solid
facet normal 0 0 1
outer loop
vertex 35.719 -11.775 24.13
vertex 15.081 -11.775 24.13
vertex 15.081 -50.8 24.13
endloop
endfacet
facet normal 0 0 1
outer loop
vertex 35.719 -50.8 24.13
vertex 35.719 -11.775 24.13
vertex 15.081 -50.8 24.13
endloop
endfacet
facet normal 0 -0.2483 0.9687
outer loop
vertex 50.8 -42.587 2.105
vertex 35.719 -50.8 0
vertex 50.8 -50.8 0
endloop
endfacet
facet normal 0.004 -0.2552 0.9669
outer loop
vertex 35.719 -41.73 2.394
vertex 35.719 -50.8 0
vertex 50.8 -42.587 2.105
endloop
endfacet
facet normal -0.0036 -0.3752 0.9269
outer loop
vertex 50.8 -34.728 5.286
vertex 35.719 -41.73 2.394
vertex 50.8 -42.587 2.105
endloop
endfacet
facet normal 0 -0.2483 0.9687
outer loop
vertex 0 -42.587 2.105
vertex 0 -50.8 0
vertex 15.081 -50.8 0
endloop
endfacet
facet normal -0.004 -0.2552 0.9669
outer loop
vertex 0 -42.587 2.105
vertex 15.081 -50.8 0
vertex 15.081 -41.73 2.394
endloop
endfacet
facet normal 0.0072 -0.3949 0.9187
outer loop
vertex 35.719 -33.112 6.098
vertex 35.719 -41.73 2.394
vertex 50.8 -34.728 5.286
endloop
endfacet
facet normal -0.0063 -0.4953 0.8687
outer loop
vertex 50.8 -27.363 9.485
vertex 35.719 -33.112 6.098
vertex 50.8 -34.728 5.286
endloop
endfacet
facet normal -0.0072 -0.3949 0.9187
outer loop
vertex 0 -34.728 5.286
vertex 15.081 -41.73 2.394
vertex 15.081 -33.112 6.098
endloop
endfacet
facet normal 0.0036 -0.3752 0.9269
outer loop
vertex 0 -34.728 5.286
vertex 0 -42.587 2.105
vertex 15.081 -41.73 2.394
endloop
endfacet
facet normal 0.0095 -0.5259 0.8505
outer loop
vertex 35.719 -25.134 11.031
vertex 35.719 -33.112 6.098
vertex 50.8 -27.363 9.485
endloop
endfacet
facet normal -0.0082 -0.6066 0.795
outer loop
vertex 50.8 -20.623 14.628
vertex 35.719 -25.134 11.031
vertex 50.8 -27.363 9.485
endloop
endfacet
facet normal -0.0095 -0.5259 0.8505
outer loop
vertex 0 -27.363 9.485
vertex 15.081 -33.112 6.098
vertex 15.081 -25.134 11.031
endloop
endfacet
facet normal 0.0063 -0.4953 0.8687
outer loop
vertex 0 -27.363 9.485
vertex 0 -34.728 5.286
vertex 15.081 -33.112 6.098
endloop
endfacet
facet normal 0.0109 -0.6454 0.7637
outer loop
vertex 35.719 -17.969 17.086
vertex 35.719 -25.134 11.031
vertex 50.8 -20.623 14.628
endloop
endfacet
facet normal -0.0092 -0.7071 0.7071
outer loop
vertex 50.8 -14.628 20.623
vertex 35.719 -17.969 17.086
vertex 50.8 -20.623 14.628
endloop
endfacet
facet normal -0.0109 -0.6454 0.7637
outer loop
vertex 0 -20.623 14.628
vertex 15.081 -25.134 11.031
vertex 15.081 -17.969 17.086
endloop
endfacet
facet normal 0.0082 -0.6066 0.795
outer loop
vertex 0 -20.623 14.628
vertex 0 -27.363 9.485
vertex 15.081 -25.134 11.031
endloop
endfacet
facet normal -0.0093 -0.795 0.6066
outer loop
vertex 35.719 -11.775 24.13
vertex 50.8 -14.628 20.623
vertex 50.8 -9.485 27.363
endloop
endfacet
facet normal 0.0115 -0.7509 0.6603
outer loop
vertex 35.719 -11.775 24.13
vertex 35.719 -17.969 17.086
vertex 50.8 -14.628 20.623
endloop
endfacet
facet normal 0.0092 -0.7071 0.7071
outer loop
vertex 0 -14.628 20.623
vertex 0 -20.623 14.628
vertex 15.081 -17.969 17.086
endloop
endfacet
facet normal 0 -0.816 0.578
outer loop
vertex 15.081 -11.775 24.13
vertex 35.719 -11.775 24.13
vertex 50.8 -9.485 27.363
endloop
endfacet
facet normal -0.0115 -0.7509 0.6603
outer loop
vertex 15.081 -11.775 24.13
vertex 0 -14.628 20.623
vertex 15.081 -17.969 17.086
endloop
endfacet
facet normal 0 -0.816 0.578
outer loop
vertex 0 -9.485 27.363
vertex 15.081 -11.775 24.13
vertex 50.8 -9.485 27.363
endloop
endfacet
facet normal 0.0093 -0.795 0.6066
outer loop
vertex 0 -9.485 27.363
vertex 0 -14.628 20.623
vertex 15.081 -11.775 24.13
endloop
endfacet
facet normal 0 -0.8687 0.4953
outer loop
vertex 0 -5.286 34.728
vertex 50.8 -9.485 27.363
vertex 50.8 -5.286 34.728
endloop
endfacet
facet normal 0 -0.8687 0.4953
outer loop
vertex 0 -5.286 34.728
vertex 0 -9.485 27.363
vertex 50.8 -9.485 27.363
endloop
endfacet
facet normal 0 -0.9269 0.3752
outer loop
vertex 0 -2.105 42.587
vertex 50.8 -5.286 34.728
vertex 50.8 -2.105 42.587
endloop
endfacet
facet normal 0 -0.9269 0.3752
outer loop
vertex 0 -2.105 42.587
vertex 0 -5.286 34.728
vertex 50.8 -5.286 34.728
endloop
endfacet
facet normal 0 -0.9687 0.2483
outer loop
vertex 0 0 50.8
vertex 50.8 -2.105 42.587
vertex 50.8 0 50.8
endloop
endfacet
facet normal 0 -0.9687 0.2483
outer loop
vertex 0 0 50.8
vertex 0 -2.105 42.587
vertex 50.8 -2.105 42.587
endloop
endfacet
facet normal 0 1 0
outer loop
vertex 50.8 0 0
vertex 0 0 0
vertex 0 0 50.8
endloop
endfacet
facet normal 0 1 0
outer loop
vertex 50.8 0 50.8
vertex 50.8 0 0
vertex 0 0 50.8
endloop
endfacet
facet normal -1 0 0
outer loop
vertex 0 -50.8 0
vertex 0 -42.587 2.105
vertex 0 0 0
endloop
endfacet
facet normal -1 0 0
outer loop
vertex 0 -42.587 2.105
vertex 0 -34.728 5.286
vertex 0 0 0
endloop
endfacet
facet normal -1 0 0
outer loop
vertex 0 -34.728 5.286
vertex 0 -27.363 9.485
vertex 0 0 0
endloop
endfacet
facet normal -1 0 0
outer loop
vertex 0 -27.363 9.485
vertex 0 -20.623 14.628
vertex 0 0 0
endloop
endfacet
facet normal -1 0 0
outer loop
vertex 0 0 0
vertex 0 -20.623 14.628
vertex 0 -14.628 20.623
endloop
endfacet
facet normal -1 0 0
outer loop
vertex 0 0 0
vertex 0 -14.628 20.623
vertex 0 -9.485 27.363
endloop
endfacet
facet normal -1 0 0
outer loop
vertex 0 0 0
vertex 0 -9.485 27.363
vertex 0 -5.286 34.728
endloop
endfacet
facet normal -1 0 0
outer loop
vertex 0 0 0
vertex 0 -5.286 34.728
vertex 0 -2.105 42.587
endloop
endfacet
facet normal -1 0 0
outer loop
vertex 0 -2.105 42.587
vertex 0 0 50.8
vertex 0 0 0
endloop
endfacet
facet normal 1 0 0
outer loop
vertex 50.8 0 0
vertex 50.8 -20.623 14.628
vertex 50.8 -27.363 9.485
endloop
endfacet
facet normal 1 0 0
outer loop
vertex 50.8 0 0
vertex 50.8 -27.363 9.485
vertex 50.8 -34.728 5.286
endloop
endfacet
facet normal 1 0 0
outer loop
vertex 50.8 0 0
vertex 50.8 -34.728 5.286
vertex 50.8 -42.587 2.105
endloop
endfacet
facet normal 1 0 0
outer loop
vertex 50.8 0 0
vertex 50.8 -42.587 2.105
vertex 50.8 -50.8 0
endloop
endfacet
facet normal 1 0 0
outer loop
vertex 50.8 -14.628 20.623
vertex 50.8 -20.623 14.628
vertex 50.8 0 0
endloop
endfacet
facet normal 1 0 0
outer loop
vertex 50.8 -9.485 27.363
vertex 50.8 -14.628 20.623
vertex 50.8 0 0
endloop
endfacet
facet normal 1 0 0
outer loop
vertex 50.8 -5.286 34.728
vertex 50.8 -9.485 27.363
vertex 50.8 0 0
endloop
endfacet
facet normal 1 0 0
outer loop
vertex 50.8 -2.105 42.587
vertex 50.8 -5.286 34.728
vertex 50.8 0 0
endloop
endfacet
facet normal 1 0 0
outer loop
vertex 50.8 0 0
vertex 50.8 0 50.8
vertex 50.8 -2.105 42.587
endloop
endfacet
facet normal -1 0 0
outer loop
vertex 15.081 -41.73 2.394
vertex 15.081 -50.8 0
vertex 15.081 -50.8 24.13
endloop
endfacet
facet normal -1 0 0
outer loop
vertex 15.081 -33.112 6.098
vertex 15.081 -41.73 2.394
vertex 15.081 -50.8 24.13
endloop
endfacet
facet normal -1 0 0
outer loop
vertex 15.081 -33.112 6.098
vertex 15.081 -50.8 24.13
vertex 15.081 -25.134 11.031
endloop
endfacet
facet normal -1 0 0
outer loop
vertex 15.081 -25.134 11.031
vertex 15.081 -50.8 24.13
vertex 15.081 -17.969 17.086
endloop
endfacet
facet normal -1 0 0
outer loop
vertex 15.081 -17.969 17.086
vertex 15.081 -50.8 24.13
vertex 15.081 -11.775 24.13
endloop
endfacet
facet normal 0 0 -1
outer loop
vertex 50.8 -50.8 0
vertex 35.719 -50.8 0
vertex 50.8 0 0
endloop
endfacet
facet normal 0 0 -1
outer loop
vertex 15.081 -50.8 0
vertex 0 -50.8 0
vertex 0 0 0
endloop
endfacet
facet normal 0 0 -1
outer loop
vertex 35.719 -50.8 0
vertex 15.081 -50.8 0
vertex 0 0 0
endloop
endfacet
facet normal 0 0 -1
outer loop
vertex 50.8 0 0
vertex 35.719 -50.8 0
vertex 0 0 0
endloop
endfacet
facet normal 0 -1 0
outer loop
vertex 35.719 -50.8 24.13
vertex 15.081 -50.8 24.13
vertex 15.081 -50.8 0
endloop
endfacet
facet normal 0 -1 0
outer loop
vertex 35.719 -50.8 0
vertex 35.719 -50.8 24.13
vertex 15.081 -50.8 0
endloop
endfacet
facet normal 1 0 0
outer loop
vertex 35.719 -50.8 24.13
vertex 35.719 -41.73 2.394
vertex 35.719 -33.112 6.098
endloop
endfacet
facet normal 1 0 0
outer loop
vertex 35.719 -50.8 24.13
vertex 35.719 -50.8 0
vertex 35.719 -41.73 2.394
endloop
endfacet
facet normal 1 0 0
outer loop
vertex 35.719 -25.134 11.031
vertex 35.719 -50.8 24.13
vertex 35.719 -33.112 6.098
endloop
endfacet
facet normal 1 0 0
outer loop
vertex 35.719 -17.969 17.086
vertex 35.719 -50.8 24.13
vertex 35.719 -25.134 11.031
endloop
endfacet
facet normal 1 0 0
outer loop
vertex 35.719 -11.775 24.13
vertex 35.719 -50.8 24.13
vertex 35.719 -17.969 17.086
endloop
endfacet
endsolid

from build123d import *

# Parameters (mm, degrees)
F1_DEPTH = 50.8
F2_DEPTH = 35.71875
F3_DEPTH = 15.08125


with BuildPart() as f1:
    # F0 (on Right) → F1 (new body)
    with BuildSketch(Plane.YZ):
        with BuildLine():
            Line((-50.8, 0), (0, 0))
            Line((0, 0), (0, 24.13))
            Line((0, 24.13), (-11.7745487484, 24.13))
            ThreePointArc((-11.7745487484, 24.13), (-29.0316591308, 8.4169932564), (-50.8, 0))
        make_face()
        with BuildLine():
            Line((-11.7745487484, 24.13), (0, 24.13))
            Line((0, 24.13), (0, 50.8))
            ThreePointArc((0, 50.8), (-4.3360005943, 36.7801275312), (-11.7745487484, 24.13))
        make_face()
    extrude(amount=F1_DEPTH)

    # F0 (on Right) → F2 (join)
    with BuildSketch(Plane.YZ):
        with BuildLine():
            Line((-11.7745487484, 24.13), (0, 24.13))
            Line((0, 24.13), (0, 50.8))
            ThreePointArc((0, 50.8), (-4.3360005943, 36.7801275312), (-11.7745487484, 24.13))
        make_face()
        with BuildLine():
            Line((-50.8, 24.13), (-50.8, 0))
            ThreePointArc((-50.8, 0), (-29.0316591308, 8.4169932564), (-11.7745487484, 24.13))
            Line((-11.7745487484, 24.13), (-50.8, 24.13))
        make_face()
        with BuildLine():
            Line((-50.8, 0), (0, 0))
            Line((0, 0), (0, 24.13))
            Line((0, 24.13), (-11.7745487484, 24.13))
            ThreePointArc((-11.7745487484, 24.13), (-29.0316591308, 8.4169932564), (-50.8, 0))
        make_face()
    extrude(amount=F2_DEPTH)

    # F0 (on Right) → F3 (cut)
    with BuildSketch(Plane.YZ):
        with BuildLine():
            Line((-50.8, 24.13), (-50.8, 0))
            ThreePointArc((-50.8, 0), (-29.0316591308, 8.4169932564), (-11.7745487484, 24.13))
            Line((-11.7745487484, 24.13), (-50.8, 24.13))
        make_face()
    extrude(amount=F3_DEPTH, mode=Mode.SUBTRACT)


solid = f1.part
